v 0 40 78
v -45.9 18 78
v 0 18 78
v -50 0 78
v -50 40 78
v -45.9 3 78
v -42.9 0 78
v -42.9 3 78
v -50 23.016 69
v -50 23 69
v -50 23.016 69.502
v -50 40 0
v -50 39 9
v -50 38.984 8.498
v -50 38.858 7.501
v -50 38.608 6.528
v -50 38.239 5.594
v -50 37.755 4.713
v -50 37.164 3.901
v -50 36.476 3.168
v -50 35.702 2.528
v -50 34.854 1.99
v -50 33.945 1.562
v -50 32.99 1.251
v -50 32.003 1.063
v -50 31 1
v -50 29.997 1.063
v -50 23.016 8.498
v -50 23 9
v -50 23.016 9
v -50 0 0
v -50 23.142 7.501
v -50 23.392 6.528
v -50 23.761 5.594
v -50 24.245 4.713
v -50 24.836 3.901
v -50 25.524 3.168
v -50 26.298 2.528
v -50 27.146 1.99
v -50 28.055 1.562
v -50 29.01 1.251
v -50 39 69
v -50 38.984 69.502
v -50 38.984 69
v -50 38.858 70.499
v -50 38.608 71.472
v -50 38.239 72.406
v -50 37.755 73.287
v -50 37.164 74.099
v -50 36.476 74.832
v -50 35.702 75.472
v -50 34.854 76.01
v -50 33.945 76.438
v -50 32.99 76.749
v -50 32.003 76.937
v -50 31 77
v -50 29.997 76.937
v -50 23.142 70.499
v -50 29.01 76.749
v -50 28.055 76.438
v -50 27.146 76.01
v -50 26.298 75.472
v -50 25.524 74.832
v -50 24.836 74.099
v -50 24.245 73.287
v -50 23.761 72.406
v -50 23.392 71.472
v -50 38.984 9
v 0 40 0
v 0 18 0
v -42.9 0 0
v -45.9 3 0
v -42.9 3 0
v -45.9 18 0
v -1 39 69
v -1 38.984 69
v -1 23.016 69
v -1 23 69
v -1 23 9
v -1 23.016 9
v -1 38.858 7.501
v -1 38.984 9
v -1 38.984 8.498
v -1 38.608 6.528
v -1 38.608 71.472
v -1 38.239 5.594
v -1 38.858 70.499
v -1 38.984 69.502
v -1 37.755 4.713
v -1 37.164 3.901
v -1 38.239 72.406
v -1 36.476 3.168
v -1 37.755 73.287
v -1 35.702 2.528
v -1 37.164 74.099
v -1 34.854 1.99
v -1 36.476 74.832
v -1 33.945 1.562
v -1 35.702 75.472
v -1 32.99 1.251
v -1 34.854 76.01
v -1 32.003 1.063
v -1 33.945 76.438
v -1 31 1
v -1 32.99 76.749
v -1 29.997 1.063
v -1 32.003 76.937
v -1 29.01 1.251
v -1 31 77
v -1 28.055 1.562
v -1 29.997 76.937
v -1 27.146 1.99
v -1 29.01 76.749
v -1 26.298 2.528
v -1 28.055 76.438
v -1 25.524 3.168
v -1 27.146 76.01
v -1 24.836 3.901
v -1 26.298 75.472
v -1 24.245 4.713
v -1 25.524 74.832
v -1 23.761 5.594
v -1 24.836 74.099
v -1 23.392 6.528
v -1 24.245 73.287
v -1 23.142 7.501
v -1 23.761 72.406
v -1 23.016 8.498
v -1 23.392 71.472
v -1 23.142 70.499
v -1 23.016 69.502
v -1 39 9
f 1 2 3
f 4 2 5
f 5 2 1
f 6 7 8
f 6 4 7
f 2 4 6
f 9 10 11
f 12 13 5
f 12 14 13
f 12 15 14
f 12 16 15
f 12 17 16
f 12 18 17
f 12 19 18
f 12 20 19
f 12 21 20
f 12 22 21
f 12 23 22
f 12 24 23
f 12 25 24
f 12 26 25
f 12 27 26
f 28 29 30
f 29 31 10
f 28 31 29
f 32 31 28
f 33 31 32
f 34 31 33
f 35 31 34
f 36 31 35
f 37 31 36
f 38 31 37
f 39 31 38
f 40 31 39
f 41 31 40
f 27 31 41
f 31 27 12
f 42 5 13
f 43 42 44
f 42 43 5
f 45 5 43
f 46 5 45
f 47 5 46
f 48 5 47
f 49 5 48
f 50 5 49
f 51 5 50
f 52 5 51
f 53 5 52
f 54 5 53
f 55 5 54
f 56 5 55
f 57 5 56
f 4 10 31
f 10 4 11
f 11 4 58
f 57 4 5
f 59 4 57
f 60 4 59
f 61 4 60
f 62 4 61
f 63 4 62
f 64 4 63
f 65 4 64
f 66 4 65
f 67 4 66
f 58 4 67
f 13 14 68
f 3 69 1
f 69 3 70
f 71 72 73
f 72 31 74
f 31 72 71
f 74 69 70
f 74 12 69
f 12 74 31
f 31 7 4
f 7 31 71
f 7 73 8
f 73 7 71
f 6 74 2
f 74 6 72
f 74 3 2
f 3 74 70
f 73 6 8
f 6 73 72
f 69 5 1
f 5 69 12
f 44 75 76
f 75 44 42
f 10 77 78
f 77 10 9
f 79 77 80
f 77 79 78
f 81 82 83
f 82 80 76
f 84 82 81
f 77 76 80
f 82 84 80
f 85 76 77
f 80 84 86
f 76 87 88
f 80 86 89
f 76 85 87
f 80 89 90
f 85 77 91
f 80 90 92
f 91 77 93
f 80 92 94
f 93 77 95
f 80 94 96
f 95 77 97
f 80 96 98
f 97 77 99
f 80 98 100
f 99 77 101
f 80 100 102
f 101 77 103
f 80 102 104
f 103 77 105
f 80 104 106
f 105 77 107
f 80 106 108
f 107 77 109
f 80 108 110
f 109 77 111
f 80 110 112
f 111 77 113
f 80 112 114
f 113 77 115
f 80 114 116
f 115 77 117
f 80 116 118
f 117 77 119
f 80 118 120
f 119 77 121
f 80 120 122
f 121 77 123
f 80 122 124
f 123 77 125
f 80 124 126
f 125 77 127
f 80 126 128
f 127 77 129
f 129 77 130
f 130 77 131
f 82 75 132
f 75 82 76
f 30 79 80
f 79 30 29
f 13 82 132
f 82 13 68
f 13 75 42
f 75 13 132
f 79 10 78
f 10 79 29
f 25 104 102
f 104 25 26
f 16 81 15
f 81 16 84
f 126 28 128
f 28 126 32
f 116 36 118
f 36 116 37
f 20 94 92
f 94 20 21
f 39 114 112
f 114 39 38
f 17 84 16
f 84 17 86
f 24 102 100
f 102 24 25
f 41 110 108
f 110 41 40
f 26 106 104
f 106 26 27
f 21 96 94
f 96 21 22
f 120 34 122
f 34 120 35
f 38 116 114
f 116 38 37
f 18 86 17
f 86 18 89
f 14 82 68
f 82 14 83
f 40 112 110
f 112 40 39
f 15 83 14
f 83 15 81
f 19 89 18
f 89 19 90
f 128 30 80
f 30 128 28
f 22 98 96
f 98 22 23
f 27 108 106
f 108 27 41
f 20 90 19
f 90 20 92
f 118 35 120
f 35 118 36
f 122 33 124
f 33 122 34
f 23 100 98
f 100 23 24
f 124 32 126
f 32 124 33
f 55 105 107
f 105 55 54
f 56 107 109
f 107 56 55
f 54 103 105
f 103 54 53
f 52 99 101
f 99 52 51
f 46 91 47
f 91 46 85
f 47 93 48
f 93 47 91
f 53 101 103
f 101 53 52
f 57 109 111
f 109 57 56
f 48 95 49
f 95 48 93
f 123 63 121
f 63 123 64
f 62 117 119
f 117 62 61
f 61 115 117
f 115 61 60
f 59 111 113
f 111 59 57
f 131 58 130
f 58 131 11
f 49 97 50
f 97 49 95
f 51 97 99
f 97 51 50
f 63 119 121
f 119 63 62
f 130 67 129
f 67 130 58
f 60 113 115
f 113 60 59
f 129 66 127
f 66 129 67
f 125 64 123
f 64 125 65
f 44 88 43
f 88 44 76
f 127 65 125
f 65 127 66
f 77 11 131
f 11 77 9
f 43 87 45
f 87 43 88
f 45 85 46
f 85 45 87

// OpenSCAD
//CUSTOMIZER VARIABLES

// space between back of cup and beginning of hook
hook_gap=15;

// height of hook clip
hook_height=3;

// total length of part (minimum 18)
overall_length=78;

//CUSTOMIZER VARIABLES END


translate([0,-23+hook_gap,0])
rotate([0,-90,0])
union() {
 difference() {
  translate([0,23-hook_gap,0]) cube([overall_length,7+hook_gap,50]);
  translate([-0.1,22.9-hook_gap,-0.1]) cube([overall_length+0.2,3.2,46-hook_height]);
  translate([-0.1,26-hook_gap,-0.1]) cube([overall_length+0.2,hook_gap,46]);
 }
 difference() {
  translate([0,30,0]) cube([overall_length,18,50]);
  translate([9,31,1]) cube([overall_length-18,16,49.1]);
  translate([9,39,1]) cylinder(r=8, h=49.1, $fn=50);
  translate([overall_length-9,39,1]) cylinder(r=8, h=49.1, $fn=50);
 }
}


//44.27
